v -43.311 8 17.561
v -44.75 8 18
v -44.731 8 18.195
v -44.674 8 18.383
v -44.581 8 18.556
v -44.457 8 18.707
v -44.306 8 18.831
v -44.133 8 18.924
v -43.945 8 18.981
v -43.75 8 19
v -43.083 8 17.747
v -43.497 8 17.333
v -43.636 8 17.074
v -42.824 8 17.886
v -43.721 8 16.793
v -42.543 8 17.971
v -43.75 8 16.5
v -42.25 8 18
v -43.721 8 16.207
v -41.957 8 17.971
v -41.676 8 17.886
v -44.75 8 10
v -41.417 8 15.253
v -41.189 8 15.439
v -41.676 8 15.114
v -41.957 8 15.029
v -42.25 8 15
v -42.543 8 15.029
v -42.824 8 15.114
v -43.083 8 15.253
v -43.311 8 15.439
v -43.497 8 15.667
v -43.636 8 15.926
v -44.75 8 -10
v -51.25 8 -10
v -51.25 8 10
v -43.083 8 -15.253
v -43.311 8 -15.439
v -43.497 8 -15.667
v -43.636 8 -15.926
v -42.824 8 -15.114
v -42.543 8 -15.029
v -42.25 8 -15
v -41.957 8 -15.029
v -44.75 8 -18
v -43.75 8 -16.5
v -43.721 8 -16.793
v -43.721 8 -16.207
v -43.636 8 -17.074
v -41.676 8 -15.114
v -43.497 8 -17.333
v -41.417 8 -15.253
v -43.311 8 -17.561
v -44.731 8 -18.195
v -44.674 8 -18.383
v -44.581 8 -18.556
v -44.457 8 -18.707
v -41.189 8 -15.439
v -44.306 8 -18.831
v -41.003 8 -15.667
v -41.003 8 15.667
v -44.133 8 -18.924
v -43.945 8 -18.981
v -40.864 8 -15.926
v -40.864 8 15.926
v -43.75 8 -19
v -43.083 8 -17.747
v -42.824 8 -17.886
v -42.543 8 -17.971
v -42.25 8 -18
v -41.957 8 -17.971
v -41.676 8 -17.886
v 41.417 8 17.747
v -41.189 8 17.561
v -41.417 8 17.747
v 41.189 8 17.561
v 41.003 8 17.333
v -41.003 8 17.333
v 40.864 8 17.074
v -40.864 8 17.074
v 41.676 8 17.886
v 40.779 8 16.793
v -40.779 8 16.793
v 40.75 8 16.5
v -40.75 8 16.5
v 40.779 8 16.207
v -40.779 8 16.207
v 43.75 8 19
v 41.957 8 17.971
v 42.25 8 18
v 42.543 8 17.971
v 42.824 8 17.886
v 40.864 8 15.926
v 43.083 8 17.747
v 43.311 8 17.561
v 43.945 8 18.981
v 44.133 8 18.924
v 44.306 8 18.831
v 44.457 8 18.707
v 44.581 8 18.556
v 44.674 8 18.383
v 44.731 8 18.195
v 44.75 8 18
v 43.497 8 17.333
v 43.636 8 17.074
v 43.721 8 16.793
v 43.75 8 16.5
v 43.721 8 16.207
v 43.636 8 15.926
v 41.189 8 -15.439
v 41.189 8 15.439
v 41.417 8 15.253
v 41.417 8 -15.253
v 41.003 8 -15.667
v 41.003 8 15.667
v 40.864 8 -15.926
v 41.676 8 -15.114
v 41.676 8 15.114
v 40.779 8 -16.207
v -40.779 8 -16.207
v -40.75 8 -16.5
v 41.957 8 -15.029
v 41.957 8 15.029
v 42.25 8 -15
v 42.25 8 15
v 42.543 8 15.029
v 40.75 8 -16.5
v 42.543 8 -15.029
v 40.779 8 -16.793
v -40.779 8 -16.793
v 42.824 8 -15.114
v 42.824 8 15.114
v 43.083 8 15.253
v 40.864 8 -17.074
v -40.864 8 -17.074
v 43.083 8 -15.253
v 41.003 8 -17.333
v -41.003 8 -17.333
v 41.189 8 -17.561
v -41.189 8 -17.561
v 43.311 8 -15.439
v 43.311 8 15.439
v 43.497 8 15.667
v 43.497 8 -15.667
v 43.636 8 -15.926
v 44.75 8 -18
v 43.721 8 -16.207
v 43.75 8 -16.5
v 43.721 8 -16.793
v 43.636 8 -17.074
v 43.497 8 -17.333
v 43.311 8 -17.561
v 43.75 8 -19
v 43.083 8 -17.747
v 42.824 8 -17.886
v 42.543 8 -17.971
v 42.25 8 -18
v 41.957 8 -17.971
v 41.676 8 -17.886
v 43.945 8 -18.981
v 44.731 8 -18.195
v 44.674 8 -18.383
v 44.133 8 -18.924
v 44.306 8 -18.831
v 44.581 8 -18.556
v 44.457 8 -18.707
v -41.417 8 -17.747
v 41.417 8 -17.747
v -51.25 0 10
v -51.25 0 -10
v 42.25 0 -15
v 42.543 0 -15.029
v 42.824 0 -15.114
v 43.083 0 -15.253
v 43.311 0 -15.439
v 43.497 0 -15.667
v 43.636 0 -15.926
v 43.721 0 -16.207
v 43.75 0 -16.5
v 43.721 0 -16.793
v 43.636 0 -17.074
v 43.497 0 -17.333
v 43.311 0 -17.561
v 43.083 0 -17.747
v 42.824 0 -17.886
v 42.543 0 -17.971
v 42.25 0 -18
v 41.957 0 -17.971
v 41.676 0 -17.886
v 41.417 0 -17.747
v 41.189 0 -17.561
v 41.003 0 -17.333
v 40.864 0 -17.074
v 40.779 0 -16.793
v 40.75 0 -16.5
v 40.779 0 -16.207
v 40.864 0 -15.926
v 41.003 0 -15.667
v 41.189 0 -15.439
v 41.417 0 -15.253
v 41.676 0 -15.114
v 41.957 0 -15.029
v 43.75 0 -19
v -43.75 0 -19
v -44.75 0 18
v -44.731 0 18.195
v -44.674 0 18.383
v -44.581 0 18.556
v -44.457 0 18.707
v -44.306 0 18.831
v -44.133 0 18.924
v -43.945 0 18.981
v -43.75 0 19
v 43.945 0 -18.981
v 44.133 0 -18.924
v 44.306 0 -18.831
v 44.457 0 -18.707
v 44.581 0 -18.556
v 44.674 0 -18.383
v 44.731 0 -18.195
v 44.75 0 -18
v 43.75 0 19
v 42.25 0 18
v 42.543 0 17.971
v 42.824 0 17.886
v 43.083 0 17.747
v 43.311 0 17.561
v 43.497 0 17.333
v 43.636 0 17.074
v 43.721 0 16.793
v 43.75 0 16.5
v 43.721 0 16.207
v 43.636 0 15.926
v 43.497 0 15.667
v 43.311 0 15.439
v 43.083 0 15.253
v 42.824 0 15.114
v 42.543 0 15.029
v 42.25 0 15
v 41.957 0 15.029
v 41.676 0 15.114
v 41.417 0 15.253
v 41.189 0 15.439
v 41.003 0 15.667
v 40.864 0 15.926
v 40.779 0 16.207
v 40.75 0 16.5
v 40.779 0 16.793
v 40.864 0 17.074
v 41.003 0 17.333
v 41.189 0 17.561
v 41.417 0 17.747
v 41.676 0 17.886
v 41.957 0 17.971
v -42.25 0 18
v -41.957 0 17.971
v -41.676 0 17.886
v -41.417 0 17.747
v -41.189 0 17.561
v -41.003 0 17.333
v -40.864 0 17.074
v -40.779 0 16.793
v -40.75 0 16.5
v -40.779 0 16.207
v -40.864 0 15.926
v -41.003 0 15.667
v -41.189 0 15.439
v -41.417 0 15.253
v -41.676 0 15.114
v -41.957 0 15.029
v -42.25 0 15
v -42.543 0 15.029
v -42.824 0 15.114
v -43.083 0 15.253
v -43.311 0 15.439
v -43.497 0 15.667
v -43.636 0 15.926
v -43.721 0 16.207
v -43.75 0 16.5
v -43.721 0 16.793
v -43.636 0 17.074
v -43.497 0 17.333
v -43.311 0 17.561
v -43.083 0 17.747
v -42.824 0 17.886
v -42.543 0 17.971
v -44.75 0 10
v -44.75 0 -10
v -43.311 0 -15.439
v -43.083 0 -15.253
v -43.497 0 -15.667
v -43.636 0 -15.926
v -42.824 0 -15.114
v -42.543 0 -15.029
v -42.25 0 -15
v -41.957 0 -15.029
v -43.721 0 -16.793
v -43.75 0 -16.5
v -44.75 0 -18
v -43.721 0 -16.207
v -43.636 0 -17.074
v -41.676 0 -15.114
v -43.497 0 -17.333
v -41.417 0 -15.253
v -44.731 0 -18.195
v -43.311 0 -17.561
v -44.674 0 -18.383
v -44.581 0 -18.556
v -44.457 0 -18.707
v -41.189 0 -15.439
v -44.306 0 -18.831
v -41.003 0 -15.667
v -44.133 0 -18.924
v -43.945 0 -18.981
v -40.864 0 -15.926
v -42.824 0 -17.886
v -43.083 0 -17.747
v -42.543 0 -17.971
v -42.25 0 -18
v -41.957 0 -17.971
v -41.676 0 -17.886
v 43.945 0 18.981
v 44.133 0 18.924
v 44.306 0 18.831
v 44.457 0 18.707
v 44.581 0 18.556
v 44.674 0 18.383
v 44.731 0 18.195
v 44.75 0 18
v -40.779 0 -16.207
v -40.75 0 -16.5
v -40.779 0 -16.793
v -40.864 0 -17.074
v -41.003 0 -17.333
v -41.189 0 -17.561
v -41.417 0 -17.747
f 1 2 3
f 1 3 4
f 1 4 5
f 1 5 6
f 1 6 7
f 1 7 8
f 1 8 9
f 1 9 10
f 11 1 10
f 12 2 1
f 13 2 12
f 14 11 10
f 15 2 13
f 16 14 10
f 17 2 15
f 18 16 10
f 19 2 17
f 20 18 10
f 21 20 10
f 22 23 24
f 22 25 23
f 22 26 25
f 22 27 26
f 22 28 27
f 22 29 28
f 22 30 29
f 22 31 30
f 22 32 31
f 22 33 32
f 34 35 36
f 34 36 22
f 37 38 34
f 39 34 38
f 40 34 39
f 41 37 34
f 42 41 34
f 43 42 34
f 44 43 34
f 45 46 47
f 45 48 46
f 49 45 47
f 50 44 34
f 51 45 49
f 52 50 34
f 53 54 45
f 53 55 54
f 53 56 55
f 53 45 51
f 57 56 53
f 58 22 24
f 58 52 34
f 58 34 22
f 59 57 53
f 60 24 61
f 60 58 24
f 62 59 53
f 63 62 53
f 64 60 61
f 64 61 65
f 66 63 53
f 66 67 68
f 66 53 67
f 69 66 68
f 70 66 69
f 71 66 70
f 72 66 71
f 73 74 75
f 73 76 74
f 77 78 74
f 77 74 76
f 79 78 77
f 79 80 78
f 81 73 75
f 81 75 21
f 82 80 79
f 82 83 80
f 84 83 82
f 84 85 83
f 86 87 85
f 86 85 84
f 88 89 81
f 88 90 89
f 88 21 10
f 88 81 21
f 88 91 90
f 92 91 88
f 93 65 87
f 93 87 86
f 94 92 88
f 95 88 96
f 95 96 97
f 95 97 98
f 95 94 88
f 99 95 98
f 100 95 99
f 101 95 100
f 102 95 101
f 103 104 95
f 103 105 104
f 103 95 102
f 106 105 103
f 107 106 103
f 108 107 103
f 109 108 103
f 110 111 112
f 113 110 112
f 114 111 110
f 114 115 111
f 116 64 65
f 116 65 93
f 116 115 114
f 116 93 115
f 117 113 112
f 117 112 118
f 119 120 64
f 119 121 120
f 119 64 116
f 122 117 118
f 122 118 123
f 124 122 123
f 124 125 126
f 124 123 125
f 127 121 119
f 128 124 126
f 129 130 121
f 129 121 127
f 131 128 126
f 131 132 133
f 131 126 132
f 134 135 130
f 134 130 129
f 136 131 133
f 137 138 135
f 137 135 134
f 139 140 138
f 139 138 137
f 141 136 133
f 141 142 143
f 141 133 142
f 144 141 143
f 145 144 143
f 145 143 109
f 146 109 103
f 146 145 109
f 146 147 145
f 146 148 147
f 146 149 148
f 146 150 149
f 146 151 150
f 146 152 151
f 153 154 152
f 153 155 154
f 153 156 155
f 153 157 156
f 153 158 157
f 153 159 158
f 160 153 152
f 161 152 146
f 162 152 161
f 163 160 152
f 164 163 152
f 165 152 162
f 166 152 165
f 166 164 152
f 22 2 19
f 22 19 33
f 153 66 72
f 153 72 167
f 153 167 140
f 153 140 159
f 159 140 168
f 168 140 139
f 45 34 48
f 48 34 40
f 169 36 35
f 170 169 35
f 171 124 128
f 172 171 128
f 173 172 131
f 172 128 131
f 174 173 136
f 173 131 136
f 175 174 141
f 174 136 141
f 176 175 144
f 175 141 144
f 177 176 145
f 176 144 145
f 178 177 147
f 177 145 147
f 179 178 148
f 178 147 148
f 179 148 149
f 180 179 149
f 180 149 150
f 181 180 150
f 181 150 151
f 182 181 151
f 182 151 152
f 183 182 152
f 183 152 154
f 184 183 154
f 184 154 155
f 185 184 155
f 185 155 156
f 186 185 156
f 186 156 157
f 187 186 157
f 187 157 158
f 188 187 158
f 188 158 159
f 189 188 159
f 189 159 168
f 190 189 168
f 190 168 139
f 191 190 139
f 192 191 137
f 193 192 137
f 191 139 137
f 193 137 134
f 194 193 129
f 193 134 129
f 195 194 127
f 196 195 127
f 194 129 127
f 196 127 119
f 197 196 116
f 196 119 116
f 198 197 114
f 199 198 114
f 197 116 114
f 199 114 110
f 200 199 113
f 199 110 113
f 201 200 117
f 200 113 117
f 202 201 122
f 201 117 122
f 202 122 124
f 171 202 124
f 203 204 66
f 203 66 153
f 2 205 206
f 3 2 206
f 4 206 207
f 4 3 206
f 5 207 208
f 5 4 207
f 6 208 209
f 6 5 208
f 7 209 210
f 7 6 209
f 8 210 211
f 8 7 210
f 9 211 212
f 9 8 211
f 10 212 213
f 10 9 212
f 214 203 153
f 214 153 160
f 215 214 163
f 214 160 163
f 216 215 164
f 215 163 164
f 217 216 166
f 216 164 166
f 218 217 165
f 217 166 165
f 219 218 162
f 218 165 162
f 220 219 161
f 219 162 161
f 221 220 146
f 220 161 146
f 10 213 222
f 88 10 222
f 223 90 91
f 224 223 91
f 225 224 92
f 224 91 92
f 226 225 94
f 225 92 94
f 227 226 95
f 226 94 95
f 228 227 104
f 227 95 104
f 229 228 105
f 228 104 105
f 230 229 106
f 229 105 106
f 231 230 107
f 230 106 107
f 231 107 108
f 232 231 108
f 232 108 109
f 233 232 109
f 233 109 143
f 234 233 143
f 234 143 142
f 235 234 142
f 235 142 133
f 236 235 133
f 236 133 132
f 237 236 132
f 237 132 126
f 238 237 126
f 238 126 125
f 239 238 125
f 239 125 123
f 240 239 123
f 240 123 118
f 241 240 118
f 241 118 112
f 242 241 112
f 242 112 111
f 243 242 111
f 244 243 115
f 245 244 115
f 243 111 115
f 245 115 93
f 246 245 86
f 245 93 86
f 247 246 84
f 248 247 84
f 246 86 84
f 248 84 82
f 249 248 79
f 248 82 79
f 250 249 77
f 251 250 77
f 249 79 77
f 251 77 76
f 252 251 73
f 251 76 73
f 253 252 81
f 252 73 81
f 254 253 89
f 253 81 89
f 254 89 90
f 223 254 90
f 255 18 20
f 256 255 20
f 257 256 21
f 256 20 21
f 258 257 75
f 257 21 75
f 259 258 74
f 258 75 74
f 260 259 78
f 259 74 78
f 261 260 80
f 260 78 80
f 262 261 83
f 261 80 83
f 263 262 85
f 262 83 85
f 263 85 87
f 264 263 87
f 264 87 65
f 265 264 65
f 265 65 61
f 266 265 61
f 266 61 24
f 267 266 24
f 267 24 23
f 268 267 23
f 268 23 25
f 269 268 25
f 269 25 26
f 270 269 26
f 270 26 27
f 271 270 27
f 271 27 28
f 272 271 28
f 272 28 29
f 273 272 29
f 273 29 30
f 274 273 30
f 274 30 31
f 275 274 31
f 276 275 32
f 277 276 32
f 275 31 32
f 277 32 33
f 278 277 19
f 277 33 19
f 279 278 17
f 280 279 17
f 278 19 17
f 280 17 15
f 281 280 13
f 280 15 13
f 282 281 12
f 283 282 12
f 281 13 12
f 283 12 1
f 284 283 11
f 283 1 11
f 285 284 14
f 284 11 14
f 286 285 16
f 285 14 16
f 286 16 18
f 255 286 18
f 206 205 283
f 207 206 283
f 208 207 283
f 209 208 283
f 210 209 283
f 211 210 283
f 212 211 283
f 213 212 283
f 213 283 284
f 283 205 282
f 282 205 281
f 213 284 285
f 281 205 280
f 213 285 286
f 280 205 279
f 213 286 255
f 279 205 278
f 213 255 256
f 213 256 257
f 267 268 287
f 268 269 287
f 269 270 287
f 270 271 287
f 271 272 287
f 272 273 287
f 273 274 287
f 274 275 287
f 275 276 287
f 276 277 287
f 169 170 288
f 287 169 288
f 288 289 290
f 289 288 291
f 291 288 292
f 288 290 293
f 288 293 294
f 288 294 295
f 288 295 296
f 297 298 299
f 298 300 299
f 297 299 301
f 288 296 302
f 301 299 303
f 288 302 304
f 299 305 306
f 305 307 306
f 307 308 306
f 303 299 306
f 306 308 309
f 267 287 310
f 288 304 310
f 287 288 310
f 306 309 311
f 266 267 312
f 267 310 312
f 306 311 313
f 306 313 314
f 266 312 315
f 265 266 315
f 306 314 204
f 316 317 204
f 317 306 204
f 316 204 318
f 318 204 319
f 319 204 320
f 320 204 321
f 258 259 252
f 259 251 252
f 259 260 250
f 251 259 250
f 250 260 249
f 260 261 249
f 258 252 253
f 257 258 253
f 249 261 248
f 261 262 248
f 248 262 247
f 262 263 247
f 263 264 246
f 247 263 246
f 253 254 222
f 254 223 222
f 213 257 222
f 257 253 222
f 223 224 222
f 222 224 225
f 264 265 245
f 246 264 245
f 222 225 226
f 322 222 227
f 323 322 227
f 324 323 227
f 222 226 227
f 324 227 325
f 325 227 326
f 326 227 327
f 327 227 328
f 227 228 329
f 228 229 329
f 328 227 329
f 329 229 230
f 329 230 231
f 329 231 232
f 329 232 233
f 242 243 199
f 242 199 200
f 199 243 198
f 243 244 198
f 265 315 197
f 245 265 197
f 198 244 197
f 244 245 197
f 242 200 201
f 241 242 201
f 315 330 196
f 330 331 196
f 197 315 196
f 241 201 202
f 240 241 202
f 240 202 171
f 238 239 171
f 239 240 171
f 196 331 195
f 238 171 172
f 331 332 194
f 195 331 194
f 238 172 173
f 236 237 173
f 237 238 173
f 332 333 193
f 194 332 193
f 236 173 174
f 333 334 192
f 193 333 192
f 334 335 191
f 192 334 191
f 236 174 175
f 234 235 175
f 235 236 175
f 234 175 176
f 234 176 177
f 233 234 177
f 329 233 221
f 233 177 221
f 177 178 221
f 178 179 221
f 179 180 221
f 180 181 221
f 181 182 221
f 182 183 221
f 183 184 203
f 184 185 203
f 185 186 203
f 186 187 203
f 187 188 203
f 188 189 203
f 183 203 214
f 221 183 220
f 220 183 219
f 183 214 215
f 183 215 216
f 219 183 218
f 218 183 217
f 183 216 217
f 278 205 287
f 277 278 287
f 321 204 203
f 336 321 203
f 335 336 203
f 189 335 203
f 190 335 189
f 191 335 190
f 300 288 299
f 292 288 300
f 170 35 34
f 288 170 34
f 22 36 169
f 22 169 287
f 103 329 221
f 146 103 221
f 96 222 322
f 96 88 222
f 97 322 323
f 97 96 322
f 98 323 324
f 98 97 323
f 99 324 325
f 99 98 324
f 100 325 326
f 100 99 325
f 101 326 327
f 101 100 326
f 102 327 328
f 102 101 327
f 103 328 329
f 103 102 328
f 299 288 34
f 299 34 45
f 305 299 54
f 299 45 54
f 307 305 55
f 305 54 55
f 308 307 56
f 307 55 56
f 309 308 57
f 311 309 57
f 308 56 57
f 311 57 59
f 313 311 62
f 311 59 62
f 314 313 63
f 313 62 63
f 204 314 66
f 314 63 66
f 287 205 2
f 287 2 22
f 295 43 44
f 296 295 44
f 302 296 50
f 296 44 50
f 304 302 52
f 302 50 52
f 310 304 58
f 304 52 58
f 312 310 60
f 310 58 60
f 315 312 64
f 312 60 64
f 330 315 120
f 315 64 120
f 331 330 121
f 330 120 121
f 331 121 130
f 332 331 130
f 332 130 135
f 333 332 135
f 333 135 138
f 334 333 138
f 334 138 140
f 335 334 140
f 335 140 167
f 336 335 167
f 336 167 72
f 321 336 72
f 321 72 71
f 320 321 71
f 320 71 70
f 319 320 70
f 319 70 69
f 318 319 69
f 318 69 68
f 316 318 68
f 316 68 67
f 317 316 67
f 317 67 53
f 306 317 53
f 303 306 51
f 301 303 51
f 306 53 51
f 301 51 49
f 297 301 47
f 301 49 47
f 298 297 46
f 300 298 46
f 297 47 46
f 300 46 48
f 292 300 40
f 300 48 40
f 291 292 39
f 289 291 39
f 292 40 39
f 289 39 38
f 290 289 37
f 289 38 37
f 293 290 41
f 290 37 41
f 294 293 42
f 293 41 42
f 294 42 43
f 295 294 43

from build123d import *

# Parameters (mm, degrees)
SKETCH1_W           = 89.5
SKETCH1_H           = 38
BOSS_EXTRUDE1_DEPTH = 8
SKETCH2_R           = 1.5
CUT_EXTRUDE1_DEPTH  = 50.270300385
FILLET1_R           = 1
SKETCH4_W           = 6.5
SKETCH4_H           = 20
BOSS_EXTRUDE2_DEPTH = 8


with BuildPart() as part:
    # Sketch1 → Boss-Extrude1 (new body)
    with BuildSketch(Plane(origin=(0, 0, 0), x_dir=(1, 0, 0), z_dir=(0, 1, 0))):
        Rectangle(SKETCH1_W, SKETCH1_H)
    extrude(amount=BOSS_EXTRUDE1_DEPTH)

    # Sketch2 → Cut-Extrude1 (cut, through all)
    with BuildSketch(Plane(origin=(0, 8, 0), x_dir=(1, 0, 0), z_dir=(0, 1, 0))):
        with Locations(Location((-42.25, 16.5, 0), (0, 0, 270))):
            Circle(SKETCH2_R)
        with Locations(Location((42.25, 16.5, 0), (0, 0, 270))):
            Circle(SKETCH2_R)
        with Locations(Location((42.25, -16.5, 0), (0, 0, 270))):
            Circle(SKETCH2_R)
        with Locations(Location((-42.25, -16.5, 0), (0, 0, 270))):
            Circle(SKETCH2_R)
    extrude(amount=-CUT_EXTRUDE1_DEPTH, mode=Mode.SUBTRACT)

    # Fillet1
    fillet1_edges = [part.edges().sort_by_distance(p)[0] for p in [
        (44.75, 4, 19),
        (-44.75, 4, 19),
        (-44.75, 4, -19),
        (44.75, 4, -19),
    ]]
    fillet(fillet1_edges, radius=FILLET1_R)

    # Sketch4 → Boss-Extrude2 (add)
    with BuildSketch(Plane(origin=(0, 8, 0), x_dir=(1, 0, 0), z_dir=(0, 1, 0))):
        with Locations((-48, 0)):
            Rectangle(SKETCH4_W, SKETCH4_H)
    extrude(amount=-BOSS_EXTRUDE2_DEPTH)


solid = part.part
